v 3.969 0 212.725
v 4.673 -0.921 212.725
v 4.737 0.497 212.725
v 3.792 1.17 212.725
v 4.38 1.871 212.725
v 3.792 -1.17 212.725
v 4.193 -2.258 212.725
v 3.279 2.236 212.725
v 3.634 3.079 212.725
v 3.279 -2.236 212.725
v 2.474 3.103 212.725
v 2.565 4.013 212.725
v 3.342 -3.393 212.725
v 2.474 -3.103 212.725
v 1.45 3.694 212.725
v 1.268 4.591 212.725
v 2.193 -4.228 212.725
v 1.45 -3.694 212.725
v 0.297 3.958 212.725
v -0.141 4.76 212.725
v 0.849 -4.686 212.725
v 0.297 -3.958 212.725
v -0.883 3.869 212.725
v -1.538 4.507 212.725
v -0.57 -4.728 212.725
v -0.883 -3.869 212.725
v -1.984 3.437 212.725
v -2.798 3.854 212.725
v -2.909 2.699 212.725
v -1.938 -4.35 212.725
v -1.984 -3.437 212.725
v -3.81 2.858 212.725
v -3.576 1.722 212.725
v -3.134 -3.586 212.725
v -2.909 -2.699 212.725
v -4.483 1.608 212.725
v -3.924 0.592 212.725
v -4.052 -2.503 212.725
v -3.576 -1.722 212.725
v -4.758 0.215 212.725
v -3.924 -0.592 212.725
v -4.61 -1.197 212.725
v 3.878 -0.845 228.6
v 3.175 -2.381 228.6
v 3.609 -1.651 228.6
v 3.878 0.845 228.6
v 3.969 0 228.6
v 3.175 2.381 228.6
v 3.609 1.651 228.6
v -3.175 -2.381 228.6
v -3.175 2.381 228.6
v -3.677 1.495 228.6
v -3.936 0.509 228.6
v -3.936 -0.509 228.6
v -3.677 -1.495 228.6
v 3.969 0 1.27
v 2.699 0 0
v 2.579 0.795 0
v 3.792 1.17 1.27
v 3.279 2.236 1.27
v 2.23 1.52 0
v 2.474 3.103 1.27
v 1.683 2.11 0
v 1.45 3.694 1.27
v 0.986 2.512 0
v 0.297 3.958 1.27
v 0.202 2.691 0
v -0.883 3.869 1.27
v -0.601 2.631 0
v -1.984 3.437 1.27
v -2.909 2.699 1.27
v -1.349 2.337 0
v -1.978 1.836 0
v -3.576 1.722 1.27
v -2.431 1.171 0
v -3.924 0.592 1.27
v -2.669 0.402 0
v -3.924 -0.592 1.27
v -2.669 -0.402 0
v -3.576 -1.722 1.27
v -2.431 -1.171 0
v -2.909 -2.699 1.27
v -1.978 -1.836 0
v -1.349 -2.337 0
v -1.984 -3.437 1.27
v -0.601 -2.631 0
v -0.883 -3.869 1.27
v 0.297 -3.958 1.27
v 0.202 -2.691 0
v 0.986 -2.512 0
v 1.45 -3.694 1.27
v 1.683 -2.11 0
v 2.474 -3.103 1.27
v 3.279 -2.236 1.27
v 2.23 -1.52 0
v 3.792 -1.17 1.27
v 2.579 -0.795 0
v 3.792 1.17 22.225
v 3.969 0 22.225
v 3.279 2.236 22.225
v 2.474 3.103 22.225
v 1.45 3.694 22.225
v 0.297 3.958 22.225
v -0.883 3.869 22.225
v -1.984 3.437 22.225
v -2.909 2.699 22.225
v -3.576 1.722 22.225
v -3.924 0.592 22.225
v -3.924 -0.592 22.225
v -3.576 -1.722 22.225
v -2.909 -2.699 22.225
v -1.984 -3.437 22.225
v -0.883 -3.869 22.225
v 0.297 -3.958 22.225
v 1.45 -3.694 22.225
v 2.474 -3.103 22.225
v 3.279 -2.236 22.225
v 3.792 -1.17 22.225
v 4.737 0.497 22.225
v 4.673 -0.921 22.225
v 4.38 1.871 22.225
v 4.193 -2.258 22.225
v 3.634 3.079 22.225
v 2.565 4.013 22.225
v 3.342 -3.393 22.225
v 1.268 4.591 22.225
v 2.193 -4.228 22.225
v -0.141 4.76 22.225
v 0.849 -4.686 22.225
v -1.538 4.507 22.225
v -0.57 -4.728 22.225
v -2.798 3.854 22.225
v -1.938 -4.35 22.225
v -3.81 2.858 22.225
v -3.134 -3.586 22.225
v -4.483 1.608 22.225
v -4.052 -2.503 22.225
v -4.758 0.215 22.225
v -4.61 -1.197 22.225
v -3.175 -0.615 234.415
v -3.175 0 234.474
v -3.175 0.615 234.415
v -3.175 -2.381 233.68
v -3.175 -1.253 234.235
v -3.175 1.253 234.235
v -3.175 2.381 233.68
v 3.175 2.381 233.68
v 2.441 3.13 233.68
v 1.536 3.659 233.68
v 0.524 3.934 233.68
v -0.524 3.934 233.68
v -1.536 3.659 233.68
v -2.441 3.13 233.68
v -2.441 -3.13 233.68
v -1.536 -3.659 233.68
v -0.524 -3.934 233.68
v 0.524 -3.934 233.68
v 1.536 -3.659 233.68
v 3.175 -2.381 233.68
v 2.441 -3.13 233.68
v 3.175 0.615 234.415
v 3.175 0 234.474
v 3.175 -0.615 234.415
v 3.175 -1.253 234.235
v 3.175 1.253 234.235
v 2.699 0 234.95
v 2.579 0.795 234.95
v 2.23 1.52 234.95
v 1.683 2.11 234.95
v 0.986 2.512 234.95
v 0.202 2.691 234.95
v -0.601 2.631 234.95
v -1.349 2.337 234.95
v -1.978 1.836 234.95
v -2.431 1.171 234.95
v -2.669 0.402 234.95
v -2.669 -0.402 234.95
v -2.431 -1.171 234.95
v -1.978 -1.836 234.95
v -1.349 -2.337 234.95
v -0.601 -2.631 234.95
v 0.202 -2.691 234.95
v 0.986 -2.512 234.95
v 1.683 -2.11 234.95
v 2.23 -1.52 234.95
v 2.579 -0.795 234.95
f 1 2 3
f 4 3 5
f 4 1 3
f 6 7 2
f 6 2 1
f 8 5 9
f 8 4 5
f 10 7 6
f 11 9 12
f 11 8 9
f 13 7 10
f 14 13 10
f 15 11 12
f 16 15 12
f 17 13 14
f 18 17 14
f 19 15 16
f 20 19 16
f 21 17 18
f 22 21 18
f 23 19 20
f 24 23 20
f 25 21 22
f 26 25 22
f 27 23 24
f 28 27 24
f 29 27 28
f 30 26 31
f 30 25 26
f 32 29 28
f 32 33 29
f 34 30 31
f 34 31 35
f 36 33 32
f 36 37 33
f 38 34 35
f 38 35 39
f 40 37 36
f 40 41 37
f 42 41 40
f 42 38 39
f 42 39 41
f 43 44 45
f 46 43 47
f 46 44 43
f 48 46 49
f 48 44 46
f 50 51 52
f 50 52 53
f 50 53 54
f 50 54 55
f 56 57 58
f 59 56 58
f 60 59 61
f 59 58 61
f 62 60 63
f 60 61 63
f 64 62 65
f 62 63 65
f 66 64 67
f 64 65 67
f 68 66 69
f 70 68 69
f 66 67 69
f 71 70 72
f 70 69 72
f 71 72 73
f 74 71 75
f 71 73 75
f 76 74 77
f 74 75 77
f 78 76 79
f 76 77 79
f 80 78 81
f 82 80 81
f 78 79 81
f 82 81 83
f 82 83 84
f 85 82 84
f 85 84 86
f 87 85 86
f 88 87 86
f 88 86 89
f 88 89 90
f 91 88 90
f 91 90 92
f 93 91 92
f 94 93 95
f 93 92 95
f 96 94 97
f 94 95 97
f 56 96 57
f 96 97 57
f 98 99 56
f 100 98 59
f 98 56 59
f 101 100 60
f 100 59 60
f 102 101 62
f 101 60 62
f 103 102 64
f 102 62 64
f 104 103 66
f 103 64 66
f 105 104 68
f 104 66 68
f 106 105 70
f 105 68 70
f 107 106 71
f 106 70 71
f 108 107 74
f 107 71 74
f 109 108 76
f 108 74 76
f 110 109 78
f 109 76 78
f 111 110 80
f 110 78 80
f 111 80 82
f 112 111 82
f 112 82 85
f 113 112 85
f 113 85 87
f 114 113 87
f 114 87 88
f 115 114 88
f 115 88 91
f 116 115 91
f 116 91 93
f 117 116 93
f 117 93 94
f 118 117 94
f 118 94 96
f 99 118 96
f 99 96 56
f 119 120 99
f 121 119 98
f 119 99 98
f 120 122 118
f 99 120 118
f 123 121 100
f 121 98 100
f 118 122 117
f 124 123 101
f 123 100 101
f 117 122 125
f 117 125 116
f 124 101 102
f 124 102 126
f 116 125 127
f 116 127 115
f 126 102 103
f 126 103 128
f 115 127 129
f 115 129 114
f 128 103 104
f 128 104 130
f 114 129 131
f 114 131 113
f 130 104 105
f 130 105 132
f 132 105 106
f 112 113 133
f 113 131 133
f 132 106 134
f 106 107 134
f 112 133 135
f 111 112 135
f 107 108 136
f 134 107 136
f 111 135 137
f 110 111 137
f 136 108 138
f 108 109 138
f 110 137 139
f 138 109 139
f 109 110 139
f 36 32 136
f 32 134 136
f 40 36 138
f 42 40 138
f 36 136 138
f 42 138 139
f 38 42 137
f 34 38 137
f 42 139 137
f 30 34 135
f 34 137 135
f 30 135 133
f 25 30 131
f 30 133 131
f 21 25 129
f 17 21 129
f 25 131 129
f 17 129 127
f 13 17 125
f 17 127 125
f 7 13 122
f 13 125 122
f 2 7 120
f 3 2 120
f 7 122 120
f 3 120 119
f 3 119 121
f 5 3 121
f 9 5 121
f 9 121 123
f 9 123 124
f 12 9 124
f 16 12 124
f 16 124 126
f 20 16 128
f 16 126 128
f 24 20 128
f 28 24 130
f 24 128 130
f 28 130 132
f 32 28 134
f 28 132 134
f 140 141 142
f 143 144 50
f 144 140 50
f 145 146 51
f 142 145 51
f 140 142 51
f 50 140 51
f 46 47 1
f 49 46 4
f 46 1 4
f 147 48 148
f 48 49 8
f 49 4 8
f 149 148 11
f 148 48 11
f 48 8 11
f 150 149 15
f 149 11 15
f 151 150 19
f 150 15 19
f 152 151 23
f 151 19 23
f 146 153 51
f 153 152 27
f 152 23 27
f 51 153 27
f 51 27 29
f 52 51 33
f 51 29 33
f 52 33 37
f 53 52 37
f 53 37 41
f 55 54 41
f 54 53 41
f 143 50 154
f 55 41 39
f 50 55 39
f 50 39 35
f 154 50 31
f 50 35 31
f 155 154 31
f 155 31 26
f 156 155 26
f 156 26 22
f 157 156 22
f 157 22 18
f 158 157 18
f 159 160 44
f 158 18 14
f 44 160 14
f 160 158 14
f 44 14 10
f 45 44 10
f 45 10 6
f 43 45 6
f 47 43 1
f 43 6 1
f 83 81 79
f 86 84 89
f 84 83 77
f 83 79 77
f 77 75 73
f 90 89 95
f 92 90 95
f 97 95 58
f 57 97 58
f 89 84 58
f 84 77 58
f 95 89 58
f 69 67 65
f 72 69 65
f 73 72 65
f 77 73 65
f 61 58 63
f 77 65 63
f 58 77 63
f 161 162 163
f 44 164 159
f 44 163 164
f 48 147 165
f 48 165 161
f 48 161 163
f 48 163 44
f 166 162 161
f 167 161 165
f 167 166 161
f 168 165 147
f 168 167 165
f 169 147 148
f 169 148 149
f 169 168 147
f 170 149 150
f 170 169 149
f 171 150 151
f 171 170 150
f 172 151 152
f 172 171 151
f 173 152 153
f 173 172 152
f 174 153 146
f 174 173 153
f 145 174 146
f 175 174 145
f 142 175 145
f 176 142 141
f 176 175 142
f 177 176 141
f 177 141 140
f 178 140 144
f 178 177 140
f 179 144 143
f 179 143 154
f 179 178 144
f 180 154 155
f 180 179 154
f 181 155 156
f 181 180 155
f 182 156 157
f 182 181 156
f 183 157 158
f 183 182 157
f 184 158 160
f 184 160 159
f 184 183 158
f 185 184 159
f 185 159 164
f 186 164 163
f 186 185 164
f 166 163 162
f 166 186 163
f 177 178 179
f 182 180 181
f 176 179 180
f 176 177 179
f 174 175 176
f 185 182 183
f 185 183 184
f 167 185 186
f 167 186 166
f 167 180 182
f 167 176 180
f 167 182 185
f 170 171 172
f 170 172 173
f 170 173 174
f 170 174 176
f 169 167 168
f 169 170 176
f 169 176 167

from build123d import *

# Parameters (mm, degrees)
SKETCH1_R               = 3.96875
EXTRUDE1_DEPTH          = 234.95
CHAMFER1_SIZE           = 1.27
SKETCH3_W               = 0.79375
SKETCH3_H               = 6.35
CUT_EXTRUDE1_DEPTH      = 4.96875
CUT_EXTRUDE1_DEPTH_BACK = 4.96875
SKETCH4_W               = 0.79375
SKETCH4_H               = 190.5


with BuildPart() as part:
    # Sketch1 → Extrude1 (new body)
    with BuildSketch(Plane.XY):
        Circle(SKETCH1_R)
    extrude(amount=EXTRUDE1_DEPTH)

    # Chamfer1
    chamfer1_edges = [part.edges().sort_by_distance(p)[0] for p in [
        (-3.96875, 0, 0),
        (-3.96875, 0, 234.95),
    ]]
    chamfer(chamfer1_edges, length=CHAMFER1_SIZE)

    # Sketch3 → Cut-Extrude1 (cut, two sides)
    with BuildSketch(Plane(origin=(0, 0, 0), x_dir=(1, 0, 0), z_dir=(0, 1, 0))) as cut_extrude1_sk:
        with Locations((3.571875, -231.775)):
            Rectangle(SKETCH3_W, SKETCH3_H)
        with Locations((-3.571875, -231.775)):
            Rectangle(SKETCH3_W, SKETCH3_H)
    extrude(amount=CUT_EXTRUDE1_DEPTH, mode=Mode.SUBTRACT)
    extrude(cut_extrude1_sk.sketch, amount=-CUT_EXTRUDE1_DEPTH_BACK, mode=Mode.SUBTRACT)

    # Sketch4 → Revolve1 (revolve)
    with BuildSketch(Plane(origin=(0, 0, 0), x_dir=(1, 0, 0), z_dir=(0, 1, 0)), mode=Mode.PRIVATE) as revolve1_sk:
        with Locations((-4.365625, -117.475)):
            Rectangle(SKETCH4_W, SKETCH4_H)
    revolve(revolve1_sk.sketch.rotate(Axis((0, 0, -16.320632547), (0, 0, 1)), 323.130102354), axis=Axis((0, 0, -16.320632547), (0, 0, 1)))  # turned: the seam where the file's is


solid = part.part
